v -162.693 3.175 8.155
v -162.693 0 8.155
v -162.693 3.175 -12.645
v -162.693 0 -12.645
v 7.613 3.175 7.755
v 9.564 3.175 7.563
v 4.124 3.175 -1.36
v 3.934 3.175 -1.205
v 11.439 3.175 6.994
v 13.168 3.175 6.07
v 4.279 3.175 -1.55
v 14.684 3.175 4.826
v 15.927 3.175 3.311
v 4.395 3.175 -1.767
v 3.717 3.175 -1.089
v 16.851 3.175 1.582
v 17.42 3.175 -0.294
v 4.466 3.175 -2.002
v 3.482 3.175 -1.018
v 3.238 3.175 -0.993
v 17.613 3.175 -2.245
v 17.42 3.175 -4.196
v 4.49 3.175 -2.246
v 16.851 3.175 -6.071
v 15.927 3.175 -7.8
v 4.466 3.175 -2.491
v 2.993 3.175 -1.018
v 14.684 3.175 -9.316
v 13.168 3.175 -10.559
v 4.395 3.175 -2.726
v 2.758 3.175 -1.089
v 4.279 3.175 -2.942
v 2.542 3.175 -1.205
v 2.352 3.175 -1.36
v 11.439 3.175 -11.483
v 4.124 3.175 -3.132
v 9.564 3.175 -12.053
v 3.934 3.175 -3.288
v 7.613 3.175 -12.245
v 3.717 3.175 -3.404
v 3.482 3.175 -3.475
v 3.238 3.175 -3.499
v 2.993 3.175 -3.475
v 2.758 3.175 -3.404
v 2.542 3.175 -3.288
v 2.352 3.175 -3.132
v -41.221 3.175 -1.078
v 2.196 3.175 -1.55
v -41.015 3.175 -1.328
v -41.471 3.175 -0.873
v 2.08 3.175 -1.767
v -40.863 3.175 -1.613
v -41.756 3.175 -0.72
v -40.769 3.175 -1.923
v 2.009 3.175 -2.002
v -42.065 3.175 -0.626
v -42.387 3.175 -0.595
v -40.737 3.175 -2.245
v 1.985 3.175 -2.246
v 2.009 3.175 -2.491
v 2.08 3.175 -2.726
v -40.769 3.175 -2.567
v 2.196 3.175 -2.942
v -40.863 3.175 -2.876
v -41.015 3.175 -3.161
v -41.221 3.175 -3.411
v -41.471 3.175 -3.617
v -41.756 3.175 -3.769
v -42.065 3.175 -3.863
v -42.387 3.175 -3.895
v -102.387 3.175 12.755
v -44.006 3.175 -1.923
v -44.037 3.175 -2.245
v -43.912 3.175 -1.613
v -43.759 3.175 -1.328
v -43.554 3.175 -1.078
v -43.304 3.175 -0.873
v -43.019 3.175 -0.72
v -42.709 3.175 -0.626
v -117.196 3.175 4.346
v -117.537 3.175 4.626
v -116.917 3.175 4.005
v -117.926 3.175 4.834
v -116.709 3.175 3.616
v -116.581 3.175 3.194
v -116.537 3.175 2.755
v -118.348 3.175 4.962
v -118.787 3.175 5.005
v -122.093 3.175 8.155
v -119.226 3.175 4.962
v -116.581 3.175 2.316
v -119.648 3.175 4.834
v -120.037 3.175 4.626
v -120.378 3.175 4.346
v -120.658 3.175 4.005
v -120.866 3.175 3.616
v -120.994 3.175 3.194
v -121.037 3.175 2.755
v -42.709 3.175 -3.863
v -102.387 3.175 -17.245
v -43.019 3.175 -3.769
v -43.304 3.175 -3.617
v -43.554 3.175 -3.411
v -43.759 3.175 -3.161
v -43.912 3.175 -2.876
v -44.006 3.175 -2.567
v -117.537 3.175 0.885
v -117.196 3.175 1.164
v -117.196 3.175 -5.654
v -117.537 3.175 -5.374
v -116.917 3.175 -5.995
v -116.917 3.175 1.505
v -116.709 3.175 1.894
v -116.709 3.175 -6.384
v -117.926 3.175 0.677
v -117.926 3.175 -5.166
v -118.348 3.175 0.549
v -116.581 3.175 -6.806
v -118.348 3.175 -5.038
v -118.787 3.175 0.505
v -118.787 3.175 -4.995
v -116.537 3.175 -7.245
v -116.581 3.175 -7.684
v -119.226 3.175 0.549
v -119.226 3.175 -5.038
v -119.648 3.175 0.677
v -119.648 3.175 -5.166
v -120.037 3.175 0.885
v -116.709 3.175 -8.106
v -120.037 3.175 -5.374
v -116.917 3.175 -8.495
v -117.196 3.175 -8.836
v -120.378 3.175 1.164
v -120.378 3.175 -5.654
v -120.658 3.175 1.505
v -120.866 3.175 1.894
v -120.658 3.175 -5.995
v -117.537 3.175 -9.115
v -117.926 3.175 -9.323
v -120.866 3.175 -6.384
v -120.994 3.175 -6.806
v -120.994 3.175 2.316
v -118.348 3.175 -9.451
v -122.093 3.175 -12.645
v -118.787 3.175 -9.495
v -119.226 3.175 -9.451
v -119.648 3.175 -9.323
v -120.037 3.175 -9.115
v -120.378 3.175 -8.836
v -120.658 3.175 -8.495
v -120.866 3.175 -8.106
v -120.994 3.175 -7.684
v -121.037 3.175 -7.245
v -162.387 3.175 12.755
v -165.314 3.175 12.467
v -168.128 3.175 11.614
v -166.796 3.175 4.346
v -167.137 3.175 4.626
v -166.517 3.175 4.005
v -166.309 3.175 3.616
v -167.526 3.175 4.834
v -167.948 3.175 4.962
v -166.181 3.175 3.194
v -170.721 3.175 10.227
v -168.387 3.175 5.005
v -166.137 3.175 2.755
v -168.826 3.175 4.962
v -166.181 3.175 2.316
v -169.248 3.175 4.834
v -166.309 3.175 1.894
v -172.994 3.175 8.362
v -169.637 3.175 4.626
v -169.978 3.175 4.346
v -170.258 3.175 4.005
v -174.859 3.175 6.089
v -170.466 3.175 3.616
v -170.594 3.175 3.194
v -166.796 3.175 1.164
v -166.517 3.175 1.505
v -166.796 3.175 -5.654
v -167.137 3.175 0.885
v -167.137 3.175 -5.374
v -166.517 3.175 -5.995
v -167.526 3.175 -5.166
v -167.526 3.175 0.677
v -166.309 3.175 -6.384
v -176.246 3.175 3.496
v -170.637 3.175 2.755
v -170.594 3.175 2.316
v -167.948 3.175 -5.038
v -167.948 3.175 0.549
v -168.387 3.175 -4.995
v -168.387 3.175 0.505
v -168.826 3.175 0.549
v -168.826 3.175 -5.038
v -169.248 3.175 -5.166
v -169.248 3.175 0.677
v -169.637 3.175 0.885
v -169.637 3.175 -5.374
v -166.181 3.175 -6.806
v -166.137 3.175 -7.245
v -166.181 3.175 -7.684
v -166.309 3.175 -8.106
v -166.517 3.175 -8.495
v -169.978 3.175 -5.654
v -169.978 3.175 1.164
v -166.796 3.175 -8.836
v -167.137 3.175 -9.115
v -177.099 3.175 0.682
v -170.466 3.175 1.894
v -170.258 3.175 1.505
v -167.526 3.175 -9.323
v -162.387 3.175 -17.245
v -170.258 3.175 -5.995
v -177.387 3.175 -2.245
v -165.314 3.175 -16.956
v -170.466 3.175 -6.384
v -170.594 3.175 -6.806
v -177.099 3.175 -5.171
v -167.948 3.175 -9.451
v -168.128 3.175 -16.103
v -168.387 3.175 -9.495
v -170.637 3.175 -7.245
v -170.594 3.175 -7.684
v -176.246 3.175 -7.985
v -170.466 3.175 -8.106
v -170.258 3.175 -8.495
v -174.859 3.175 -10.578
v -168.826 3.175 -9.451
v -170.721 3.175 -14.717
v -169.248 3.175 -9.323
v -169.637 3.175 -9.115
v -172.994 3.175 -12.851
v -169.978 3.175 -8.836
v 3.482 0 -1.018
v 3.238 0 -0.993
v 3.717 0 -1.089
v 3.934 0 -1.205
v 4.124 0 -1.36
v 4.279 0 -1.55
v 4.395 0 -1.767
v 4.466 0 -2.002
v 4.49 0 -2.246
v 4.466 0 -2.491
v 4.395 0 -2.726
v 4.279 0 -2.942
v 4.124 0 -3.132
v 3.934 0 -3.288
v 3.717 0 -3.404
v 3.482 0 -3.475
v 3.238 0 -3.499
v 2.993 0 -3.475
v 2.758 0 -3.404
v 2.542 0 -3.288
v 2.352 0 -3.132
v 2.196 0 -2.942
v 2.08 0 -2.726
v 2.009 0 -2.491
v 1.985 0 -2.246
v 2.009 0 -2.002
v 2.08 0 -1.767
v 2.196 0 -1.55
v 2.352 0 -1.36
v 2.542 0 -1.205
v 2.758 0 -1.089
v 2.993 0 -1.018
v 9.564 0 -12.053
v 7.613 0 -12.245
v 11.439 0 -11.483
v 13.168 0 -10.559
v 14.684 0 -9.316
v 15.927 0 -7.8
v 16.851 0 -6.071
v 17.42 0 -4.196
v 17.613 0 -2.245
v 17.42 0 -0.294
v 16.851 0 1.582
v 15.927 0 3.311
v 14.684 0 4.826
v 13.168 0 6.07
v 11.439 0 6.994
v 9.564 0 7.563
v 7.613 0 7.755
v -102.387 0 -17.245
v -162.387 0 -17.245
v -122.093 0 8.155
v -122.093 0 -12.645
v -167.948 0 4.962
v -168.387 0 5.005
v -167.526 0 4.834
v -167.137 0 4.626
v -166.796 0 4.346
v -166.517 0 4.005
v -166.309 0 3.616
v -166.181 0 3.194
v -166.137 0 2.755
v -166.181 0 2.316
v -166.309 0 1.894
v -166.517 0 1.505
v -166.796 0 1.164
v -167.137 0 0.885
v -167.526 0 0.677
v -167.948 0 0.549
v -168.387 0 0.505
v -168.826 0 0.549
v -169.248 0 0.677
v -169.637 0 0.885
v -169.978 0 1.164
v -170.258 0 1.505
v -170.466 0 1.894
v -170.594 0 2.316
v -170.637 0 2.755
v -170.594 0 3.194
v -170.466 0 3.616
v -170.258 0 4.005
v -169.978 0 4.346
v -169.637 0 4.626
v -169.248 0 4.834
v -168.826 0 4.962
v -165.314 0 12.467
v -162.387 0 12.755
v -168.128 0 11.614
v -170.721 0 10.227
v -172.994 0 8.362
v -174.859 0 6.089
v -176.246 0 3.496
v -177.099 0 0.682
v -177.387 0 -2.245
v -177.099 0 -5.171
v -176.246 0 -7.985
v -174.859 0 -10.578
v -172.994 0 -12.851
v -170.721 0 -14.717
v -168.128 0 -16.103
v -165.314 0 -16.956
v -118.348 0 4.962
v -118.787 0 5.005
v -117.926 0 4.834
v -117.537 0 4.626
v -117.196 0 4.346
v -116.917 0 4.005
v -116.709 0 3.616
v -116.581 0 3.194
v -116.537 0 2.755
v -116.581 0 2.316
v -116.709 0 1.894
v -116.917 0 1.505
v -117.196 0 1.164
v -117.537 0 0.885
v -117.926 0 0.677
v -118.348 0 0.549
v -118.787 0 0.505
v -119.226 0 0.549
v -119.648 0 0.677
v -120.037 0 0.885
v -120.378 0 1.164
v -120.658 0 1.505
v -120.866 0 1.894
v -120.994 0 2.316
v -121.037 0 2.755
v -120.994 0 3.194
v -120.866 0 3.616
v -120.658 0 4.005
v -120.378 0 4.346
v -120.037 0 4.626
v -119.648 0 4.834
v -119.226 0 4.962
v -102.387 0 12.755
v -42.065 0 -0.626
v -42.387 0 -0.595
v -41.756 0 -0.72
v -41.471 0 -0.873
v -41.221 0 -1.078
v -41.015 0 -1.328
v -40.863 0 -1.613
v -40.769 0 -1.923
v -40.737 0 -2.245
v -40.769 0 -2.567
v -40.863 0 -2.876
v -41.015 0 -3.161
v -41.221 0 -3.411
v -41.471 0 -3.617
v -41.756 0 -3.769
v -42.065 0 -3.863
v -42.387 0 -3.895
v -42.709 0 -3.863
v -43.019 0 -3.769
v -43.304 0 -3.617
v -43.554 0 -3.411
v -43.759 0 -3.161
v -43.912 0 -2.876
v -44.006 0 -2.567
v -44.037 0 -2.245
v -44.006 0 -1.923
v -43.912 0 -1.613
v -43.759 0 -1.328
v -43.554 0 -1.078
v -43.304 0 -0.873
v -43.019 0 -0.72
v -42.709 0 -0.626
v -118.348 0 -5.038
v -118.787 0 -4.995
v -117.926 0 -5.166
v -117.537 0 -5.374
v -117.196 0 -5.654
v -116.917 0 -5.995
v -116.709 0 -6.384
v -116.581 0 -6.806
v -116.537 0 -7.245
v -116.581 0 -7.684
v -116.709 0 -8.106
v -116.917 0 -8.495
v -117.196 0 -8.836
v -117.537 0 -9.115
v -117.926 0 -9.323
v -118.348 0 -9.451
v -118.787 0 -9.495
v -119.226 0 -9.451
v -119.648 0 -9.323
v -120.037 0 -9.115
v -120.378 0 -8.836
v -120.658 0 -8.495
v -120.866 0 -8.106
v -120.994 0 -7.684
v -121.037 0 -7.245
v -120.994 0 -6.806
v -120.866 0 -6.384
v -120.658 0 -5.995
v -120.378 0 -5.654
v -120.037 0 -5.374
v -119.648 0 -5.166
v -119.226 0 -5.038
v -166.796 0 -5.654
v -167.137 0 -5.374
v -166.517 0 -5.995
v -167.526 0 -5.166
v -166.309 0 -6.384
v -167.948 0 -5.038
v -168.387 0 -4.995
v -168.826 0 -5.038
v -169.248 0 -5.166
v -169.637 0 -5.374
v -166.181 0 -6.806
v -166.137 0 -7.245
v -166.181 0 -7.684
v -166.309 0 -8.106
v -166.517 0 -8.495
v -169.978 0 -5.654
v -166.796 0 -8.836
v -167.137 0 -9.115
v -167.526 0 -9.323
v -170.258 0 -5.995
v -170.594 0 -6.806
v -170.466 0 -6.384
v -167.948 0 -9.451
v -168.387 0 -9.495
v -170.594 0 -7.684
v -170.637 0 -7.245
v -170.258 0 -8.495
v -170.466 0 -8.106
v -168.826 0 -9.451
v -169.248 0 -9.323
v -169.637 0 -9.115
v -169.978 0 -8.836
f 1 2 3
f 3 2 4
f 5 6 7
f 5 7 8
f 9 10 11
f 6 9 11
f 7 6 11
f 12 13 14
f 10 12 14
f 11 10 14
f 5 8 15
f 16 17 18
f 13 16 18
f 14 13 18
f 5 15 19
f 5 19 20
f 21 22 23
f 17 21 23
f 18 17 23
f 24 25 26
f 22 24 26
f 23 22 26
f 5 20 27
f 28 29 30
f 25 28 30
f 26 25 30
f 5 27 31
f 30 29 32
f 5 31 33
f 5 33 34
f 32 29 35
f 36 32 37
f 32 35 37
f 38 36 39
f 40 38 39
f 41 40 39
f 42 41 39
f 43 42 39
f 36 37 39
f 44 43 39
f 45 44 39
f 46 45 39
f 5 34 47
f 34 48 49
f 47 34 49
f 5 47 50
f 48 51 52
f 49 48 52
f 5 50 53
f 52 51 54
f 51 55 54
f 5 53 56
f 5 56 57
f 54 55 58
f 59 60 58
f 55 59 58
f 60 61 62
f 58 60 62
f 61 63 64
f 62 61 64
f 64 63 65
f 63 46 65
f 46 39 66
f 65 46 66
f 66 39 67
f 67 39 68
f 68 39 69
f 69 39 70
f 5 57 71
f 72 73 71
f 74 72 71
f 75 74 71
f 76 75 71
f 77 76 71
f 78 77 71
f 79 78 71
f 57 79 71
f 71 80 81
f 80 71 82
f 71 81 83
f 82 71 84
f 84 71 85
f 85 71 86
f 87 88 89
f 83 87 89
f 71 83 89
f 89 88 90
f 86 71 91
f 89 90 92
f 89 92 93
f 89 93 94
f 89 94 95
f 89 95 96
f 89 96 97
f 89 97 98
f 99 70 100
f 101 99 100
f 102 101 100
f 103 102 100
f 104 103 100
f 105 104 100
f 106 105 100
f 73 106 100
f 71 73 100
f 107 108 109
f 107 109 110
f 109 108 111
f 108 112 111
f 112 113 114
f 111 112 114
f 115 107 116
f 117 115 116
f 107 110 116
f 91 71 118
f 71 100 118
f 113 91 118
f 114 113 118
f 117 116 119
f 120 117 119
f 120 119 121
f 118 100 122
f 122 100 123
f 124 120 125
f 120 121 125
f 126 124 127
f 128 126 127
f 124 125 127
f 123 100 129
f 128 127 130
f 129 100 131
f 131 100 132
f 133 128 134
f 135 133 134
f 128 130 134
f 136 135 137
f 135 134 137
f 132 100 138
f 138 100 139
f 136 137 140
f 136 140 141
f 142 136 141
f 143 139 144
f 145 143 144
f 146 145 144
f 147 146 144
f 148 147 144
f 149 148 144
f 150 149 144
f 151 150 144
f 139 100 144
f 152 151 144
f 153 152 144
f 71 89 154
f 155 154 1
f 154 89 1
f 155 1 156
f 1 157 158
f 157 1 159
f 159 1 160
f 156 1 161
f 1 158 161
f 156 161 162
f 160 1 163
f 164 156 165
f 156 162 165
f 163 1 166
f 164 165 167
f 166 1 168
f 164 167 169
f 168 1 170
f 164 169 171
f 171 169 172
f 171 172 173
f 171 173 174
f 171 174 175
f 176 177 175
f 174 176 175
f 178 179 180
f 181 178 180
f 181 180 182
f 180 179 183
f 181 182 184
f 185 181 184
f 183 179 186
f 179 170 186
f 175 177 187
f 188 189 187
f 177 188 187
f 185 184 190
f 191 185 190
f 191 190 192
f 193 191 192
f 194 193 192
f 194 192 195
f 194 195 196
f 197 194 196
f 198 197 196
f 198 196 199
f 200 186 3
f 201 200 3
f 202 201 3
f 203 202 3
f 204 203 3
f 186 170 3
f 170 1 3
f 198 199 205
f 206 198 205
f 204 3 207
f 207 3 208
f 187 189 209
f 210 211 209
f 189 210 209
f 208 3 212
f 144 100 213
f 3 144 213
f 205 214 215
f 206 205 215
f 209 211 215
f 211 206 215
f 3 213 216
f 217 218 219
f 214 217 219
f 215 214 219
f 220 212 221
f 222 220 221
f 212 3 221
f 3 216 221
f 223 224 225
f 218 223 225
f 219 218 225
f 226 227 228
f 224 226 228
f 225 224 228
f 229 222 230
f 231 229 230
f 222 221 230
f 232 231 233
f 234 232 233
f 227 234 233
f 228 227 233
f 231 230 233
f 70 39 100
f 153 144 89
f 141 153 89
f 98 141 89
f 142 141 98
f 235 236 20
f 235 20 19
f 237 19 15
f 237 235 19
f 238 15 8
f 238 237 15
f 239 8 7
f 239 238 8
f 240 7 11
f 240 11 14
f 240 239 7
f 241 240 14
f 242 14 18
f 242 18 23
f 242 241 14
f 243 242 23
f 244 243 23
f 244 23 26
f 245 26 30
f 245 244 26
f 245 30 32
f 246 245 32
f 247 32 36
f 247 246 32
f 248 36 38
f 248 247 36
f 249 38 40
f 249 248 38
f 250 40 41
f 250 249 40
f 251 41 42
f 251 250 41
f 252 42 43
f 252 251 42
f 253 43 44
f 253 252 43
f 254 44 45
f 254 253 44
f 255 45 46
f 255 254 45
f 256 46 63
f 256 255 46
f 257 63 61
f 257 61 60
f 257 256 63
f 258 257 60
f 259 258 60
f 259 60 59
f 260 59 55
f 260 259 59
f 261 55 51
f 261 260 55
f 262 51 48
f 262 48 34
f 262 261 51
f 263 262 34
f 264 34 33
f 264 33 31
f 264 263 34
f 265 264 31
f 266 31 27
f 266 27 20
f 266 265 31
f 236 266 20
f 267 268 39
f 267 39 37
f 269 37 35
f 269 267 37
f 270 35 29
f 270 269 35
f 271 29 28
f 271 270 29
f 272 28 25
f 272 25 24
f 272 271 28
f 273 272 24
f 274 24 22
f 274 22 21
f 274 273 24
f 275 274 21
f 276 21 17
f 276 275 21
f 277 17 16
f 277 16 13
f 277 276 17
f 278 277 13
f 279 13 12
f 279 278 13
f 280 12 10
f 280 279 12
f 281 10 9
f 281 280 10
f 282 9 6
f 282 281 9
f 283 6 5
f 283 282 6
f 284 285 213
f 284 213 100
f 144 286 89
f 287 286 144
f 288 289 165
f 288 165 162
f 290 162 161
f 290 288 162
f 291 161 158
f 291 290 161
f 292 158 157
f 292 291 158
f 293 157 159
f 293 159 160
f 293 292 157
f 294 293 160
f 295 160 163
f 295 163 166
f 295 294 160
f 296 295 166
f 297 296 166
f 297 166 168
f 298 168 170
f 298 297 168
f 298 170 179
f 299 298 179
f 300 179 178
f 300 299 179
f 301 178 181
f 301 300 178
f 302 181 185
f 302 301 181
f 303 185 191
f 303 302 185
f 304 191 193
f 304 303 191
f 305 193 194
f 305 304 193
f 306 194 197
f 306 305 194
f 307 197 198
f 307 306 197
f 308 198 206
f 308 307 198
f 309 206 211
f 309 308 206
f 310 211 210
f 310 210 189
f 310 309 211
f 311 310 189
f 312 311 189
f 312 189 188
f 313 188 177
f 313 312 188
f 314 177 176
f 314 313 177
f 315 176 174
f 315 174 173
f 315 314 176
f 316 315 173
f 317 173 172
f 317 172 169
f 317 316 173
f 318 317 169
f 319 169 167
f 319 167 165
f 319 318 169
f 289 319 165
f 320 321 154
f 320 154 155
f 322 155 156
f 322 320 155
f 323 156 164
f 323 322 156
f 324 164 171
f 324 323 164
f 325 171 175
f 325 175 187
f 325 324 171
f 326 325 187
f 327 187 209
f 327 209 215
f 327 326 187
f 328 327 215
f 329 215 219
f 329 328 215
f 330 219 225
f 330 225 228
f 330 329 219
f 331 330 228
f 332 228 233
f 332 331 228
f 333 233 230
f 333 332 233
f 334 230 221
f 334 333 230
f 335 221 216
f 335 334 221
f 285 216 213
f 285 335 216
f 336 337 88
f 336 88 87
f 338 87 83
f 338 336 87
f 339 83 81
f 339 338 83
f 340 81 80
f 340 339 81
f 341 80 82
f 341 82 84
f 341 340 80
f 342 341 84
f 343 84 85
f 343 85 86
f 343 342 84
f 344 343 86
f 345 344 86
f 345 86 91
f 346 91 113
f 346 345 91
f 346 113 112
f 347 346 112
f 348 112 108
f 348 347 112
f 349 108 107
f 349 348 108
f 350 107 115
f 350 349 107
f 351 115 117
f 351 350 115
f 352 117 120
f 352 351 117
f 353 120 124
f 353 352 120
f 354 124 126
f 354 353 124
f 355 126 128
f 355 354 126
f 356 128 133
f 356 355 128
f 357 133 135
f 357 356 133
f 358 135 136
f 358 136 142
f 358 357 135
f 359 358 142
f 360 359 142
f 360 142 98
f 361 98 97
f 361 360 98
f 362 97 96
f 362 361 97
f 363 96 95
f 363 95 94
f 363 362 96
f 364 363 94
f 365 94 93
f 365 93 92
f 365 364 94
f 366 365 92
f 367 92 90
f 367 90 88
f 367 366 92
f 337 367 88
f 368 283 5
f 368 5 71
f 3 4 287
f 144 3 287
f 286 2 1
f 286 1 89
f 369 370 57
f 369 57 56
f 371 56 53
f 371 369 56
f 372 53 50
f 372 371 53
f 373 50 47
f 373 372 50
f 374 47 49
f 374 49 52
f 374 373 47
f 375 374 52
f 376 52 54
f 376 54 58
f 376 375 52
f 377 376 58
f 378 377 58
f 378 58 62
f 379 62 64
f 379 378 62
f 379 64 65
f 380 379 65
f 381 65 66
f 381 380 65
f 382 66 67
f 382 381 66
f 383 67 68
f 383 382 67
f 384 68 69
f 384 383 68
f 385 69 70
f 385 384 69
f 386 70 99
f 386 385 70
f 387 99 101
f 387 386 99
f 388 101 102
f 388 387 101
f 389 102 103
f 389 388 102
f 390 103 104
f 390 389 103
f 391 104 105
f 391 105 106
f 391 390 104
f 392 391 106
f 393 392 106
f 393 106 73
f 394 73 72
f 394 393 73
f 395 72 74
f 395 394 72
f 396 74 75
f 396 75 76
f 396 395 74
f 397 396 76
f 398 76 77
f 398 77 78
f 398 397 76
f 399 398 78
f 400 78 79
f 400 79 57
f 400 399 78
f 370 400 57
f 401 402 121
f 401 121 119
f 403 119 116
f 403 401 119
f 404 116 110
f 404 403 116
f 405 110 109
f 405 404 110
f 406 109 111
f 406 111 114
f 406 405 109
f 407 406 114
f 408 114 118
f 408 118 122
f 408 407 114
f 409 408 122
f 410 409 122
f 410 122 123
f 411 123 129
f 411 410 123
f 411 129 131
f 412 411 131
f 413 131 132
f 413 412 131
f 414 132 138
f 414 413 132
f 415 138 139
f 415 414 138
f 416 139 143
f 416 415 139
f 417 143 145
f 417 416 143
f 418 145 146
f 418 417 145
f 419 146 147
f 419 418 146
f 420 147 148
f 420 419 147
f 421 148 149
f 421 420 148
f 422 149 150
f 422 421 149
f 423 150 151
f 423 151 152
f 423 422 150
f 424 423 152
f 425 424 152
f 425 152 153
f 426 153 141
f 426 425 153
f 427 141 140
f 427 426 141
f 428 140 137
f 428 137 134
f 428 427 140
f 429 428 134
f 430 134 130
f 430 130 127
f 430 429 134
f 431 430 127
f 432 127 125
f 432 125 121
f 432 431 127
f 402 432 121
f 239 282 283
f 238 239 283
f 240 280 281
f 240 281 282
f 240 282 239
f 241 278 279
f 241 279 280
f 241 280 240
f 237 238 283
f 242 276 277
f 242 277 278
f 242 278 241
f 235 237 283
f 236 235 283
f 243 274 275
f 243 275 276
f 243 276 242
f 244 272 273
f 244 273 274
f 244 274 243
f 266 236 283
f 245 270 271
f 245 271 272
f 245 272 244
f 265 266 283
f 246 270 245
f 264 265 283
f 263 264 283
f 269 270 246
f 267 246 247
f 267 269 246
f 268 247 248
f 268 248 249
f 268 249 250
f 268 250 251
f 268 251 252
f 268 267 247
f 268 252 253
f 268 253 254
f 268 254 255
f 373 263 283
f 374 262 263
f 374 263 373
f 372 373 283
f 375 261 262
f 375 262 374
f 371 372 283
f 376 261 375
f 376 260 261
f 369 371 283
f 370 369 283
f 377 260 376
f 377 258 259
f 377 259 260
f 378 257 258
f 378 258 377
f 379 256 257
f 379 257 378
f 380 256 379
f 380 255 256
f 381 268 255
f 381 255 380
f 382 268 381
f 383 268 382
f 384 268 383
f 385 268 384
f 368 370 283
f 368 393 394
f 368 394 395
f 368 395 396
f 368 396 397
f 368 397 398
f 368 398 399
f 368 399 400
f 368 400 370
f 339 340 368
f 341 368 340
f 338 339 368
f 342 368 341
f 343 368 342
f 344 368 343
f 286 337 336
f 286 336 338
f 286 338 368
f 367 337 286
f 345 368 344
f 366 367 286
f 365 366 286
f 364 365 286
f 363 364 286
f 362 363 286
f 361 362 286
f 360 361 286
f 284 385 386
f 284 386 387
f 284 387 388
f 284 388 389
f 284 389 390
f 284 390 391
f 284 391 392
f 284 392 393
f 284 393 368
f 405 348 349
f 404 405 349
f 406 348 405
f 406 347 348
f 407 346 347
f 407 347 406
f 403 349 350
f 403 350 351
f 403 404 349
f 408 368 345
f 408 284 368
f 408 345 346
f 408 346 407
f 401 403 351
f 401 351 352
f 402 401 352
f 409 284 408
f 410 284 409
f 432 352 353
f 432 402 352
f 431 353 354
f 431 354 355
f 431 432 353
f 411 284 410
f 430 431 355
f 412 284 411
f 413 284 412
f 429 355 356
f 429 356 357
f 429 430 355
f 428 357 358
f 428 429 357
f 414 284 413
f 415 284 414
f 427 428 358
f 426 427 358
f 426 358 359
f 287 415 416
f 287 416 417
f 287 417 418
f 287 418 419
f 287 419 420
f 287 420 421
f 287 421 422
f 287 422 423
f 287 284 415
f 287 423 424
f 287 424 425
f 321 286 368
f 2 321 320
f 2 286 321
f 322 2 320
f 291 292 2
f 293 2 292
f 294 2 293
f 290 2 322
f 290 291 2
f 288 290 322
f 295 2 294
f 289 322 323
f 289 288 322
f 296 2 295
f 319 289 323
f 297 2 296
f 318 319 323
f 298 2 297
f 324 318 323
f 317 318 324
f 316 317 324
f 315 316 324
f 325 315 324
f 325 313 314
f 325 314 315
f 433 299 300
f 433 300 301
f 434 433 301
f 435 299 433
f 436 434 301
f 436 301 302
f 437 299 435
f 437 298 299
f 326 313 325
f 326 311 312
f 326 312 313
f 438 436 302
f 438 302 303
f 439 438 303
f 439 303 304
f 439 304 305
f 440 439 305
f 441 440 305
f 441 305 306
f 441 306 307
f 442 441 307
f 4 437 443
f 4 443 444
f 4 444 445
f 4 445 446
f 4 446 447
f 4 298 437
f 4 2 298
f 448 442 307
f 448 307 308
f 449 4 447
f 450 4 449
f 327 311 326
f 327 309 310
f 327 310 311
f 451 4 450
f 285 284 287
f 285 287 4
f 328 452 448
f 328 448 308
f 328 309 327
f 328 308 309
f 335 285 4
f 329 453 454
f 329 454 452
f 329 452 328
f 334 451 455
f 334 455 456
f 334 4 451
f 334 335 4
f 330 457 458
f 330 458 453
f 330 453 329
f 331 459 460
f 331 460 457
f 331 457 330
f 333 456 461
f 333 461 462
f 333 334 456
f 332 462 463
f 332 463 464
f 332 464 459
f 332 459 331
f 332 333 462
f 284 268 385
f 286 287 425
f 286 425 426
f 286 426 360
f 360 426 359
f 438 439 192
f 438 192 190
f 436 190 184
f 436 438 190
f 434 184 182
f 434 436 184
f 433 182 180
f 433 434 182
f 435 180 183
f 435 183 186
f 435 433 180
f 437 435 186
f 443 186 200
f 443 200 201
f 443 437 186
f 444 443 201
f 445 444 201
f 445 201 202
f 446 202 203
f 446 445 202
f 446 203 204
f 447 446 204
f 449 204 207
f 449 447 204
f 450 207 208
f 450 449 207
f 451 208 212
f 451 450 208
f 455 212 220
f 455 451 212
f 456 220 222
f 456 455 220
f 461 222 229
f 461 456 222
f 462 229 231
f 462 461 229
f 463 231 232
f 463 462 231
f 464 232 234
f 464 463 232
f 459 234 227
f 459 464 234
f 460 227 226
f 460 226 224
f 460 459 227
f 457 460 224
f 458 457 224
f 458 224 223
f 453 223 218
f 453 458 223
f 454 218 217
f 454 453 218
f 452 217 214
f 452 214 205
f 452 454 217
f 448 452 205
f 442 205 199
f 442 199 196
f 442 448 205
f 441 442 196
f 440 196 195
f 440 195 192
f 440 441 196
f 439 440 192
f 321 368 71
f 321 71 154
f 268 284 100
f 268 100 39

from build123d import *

# Parameters (mm, degrees)
SKETCH1_R           = 2.25
SKETCH1_R_2         = 1.65
SKETCH1_R_3         = 1.25282433
SKETCH1_W           = 40.6
SKETCH1_H           = 20.8
BOSS_EXTRUDE1_DEPTH = 3.175


with BuildPart() as part:
    # Sketch1 → Boss-Extrude1 (new body)
    with BuildSketch(Plane(origin=(0, 0, 0), x_dir=(1, 0, 0), z_dir=(0, 1, 0))):
        with BuildLine():
            Line((-162.38735588, 17.244652891), (-102.38735588, 17.244652891))
            Line((-102.38735588, 17.244652891), (7.61264412, 12.244652891))
            ThreePointArc((7.61264412, 12.244652891), (17.61264412, 2.244652891), (7.61264412, -7.755347109))
            Line((7.61264412, -7.755347109), (-102.38735588, -12.755347109))
            Line((-102.38735588, -12.755347109), (-162.38735588, -12.755347109))
            ThreePointArc((-162.38735588, -12.755347109), (-177.38735588, 2.244652891), (-162.38735588, 17.244652891))
        make_face()
        with Locations(Location((-168.38735588, 7.244652891, 0), (0, 0, 270))):
            Circle(SKETCH1_R, mode=Mode.SUBTRACT)
        with Locations(Location((-168.38735588, -2.755347109, 0), (0, 0, 270))):
            Circle(SKETCH1_R, mode=Mode.SUBTRACT)
        with Locations(Location((-118.78735588, 7.244652891, 0), (0, 0, 270))):
            Circle(SKETCH1_R, mode=Mode.SUBTRACT)
        with Locations(Location((-118.78735588, -2.755347109, 0), (0, 0, 270))):
            Circle(SKETCH1_R, mode=Mode.SUBTRACT)
        with Locations(Location((-42.38735588, 2.244652891, 0), (0, 0, 270))):
            Circle(SKETCH1_R_2, mode=Mode.SUBTRACT)
        with Locations(Location((3.23764412, 2.246310682, 0), (0, 0, 270))):
            Circle(SKETCH1_R_3, mode=Mode.SUBTRACT)
        with Locations((-142.392621679, 2.244652891)):
            Rectangle(SKETCH1_W, SKETCH1_H, mode=Mode.SUBTRACT)
    extrude(amount=BOSS_EXTRUDE1_DEPTH)


solid = part.part
